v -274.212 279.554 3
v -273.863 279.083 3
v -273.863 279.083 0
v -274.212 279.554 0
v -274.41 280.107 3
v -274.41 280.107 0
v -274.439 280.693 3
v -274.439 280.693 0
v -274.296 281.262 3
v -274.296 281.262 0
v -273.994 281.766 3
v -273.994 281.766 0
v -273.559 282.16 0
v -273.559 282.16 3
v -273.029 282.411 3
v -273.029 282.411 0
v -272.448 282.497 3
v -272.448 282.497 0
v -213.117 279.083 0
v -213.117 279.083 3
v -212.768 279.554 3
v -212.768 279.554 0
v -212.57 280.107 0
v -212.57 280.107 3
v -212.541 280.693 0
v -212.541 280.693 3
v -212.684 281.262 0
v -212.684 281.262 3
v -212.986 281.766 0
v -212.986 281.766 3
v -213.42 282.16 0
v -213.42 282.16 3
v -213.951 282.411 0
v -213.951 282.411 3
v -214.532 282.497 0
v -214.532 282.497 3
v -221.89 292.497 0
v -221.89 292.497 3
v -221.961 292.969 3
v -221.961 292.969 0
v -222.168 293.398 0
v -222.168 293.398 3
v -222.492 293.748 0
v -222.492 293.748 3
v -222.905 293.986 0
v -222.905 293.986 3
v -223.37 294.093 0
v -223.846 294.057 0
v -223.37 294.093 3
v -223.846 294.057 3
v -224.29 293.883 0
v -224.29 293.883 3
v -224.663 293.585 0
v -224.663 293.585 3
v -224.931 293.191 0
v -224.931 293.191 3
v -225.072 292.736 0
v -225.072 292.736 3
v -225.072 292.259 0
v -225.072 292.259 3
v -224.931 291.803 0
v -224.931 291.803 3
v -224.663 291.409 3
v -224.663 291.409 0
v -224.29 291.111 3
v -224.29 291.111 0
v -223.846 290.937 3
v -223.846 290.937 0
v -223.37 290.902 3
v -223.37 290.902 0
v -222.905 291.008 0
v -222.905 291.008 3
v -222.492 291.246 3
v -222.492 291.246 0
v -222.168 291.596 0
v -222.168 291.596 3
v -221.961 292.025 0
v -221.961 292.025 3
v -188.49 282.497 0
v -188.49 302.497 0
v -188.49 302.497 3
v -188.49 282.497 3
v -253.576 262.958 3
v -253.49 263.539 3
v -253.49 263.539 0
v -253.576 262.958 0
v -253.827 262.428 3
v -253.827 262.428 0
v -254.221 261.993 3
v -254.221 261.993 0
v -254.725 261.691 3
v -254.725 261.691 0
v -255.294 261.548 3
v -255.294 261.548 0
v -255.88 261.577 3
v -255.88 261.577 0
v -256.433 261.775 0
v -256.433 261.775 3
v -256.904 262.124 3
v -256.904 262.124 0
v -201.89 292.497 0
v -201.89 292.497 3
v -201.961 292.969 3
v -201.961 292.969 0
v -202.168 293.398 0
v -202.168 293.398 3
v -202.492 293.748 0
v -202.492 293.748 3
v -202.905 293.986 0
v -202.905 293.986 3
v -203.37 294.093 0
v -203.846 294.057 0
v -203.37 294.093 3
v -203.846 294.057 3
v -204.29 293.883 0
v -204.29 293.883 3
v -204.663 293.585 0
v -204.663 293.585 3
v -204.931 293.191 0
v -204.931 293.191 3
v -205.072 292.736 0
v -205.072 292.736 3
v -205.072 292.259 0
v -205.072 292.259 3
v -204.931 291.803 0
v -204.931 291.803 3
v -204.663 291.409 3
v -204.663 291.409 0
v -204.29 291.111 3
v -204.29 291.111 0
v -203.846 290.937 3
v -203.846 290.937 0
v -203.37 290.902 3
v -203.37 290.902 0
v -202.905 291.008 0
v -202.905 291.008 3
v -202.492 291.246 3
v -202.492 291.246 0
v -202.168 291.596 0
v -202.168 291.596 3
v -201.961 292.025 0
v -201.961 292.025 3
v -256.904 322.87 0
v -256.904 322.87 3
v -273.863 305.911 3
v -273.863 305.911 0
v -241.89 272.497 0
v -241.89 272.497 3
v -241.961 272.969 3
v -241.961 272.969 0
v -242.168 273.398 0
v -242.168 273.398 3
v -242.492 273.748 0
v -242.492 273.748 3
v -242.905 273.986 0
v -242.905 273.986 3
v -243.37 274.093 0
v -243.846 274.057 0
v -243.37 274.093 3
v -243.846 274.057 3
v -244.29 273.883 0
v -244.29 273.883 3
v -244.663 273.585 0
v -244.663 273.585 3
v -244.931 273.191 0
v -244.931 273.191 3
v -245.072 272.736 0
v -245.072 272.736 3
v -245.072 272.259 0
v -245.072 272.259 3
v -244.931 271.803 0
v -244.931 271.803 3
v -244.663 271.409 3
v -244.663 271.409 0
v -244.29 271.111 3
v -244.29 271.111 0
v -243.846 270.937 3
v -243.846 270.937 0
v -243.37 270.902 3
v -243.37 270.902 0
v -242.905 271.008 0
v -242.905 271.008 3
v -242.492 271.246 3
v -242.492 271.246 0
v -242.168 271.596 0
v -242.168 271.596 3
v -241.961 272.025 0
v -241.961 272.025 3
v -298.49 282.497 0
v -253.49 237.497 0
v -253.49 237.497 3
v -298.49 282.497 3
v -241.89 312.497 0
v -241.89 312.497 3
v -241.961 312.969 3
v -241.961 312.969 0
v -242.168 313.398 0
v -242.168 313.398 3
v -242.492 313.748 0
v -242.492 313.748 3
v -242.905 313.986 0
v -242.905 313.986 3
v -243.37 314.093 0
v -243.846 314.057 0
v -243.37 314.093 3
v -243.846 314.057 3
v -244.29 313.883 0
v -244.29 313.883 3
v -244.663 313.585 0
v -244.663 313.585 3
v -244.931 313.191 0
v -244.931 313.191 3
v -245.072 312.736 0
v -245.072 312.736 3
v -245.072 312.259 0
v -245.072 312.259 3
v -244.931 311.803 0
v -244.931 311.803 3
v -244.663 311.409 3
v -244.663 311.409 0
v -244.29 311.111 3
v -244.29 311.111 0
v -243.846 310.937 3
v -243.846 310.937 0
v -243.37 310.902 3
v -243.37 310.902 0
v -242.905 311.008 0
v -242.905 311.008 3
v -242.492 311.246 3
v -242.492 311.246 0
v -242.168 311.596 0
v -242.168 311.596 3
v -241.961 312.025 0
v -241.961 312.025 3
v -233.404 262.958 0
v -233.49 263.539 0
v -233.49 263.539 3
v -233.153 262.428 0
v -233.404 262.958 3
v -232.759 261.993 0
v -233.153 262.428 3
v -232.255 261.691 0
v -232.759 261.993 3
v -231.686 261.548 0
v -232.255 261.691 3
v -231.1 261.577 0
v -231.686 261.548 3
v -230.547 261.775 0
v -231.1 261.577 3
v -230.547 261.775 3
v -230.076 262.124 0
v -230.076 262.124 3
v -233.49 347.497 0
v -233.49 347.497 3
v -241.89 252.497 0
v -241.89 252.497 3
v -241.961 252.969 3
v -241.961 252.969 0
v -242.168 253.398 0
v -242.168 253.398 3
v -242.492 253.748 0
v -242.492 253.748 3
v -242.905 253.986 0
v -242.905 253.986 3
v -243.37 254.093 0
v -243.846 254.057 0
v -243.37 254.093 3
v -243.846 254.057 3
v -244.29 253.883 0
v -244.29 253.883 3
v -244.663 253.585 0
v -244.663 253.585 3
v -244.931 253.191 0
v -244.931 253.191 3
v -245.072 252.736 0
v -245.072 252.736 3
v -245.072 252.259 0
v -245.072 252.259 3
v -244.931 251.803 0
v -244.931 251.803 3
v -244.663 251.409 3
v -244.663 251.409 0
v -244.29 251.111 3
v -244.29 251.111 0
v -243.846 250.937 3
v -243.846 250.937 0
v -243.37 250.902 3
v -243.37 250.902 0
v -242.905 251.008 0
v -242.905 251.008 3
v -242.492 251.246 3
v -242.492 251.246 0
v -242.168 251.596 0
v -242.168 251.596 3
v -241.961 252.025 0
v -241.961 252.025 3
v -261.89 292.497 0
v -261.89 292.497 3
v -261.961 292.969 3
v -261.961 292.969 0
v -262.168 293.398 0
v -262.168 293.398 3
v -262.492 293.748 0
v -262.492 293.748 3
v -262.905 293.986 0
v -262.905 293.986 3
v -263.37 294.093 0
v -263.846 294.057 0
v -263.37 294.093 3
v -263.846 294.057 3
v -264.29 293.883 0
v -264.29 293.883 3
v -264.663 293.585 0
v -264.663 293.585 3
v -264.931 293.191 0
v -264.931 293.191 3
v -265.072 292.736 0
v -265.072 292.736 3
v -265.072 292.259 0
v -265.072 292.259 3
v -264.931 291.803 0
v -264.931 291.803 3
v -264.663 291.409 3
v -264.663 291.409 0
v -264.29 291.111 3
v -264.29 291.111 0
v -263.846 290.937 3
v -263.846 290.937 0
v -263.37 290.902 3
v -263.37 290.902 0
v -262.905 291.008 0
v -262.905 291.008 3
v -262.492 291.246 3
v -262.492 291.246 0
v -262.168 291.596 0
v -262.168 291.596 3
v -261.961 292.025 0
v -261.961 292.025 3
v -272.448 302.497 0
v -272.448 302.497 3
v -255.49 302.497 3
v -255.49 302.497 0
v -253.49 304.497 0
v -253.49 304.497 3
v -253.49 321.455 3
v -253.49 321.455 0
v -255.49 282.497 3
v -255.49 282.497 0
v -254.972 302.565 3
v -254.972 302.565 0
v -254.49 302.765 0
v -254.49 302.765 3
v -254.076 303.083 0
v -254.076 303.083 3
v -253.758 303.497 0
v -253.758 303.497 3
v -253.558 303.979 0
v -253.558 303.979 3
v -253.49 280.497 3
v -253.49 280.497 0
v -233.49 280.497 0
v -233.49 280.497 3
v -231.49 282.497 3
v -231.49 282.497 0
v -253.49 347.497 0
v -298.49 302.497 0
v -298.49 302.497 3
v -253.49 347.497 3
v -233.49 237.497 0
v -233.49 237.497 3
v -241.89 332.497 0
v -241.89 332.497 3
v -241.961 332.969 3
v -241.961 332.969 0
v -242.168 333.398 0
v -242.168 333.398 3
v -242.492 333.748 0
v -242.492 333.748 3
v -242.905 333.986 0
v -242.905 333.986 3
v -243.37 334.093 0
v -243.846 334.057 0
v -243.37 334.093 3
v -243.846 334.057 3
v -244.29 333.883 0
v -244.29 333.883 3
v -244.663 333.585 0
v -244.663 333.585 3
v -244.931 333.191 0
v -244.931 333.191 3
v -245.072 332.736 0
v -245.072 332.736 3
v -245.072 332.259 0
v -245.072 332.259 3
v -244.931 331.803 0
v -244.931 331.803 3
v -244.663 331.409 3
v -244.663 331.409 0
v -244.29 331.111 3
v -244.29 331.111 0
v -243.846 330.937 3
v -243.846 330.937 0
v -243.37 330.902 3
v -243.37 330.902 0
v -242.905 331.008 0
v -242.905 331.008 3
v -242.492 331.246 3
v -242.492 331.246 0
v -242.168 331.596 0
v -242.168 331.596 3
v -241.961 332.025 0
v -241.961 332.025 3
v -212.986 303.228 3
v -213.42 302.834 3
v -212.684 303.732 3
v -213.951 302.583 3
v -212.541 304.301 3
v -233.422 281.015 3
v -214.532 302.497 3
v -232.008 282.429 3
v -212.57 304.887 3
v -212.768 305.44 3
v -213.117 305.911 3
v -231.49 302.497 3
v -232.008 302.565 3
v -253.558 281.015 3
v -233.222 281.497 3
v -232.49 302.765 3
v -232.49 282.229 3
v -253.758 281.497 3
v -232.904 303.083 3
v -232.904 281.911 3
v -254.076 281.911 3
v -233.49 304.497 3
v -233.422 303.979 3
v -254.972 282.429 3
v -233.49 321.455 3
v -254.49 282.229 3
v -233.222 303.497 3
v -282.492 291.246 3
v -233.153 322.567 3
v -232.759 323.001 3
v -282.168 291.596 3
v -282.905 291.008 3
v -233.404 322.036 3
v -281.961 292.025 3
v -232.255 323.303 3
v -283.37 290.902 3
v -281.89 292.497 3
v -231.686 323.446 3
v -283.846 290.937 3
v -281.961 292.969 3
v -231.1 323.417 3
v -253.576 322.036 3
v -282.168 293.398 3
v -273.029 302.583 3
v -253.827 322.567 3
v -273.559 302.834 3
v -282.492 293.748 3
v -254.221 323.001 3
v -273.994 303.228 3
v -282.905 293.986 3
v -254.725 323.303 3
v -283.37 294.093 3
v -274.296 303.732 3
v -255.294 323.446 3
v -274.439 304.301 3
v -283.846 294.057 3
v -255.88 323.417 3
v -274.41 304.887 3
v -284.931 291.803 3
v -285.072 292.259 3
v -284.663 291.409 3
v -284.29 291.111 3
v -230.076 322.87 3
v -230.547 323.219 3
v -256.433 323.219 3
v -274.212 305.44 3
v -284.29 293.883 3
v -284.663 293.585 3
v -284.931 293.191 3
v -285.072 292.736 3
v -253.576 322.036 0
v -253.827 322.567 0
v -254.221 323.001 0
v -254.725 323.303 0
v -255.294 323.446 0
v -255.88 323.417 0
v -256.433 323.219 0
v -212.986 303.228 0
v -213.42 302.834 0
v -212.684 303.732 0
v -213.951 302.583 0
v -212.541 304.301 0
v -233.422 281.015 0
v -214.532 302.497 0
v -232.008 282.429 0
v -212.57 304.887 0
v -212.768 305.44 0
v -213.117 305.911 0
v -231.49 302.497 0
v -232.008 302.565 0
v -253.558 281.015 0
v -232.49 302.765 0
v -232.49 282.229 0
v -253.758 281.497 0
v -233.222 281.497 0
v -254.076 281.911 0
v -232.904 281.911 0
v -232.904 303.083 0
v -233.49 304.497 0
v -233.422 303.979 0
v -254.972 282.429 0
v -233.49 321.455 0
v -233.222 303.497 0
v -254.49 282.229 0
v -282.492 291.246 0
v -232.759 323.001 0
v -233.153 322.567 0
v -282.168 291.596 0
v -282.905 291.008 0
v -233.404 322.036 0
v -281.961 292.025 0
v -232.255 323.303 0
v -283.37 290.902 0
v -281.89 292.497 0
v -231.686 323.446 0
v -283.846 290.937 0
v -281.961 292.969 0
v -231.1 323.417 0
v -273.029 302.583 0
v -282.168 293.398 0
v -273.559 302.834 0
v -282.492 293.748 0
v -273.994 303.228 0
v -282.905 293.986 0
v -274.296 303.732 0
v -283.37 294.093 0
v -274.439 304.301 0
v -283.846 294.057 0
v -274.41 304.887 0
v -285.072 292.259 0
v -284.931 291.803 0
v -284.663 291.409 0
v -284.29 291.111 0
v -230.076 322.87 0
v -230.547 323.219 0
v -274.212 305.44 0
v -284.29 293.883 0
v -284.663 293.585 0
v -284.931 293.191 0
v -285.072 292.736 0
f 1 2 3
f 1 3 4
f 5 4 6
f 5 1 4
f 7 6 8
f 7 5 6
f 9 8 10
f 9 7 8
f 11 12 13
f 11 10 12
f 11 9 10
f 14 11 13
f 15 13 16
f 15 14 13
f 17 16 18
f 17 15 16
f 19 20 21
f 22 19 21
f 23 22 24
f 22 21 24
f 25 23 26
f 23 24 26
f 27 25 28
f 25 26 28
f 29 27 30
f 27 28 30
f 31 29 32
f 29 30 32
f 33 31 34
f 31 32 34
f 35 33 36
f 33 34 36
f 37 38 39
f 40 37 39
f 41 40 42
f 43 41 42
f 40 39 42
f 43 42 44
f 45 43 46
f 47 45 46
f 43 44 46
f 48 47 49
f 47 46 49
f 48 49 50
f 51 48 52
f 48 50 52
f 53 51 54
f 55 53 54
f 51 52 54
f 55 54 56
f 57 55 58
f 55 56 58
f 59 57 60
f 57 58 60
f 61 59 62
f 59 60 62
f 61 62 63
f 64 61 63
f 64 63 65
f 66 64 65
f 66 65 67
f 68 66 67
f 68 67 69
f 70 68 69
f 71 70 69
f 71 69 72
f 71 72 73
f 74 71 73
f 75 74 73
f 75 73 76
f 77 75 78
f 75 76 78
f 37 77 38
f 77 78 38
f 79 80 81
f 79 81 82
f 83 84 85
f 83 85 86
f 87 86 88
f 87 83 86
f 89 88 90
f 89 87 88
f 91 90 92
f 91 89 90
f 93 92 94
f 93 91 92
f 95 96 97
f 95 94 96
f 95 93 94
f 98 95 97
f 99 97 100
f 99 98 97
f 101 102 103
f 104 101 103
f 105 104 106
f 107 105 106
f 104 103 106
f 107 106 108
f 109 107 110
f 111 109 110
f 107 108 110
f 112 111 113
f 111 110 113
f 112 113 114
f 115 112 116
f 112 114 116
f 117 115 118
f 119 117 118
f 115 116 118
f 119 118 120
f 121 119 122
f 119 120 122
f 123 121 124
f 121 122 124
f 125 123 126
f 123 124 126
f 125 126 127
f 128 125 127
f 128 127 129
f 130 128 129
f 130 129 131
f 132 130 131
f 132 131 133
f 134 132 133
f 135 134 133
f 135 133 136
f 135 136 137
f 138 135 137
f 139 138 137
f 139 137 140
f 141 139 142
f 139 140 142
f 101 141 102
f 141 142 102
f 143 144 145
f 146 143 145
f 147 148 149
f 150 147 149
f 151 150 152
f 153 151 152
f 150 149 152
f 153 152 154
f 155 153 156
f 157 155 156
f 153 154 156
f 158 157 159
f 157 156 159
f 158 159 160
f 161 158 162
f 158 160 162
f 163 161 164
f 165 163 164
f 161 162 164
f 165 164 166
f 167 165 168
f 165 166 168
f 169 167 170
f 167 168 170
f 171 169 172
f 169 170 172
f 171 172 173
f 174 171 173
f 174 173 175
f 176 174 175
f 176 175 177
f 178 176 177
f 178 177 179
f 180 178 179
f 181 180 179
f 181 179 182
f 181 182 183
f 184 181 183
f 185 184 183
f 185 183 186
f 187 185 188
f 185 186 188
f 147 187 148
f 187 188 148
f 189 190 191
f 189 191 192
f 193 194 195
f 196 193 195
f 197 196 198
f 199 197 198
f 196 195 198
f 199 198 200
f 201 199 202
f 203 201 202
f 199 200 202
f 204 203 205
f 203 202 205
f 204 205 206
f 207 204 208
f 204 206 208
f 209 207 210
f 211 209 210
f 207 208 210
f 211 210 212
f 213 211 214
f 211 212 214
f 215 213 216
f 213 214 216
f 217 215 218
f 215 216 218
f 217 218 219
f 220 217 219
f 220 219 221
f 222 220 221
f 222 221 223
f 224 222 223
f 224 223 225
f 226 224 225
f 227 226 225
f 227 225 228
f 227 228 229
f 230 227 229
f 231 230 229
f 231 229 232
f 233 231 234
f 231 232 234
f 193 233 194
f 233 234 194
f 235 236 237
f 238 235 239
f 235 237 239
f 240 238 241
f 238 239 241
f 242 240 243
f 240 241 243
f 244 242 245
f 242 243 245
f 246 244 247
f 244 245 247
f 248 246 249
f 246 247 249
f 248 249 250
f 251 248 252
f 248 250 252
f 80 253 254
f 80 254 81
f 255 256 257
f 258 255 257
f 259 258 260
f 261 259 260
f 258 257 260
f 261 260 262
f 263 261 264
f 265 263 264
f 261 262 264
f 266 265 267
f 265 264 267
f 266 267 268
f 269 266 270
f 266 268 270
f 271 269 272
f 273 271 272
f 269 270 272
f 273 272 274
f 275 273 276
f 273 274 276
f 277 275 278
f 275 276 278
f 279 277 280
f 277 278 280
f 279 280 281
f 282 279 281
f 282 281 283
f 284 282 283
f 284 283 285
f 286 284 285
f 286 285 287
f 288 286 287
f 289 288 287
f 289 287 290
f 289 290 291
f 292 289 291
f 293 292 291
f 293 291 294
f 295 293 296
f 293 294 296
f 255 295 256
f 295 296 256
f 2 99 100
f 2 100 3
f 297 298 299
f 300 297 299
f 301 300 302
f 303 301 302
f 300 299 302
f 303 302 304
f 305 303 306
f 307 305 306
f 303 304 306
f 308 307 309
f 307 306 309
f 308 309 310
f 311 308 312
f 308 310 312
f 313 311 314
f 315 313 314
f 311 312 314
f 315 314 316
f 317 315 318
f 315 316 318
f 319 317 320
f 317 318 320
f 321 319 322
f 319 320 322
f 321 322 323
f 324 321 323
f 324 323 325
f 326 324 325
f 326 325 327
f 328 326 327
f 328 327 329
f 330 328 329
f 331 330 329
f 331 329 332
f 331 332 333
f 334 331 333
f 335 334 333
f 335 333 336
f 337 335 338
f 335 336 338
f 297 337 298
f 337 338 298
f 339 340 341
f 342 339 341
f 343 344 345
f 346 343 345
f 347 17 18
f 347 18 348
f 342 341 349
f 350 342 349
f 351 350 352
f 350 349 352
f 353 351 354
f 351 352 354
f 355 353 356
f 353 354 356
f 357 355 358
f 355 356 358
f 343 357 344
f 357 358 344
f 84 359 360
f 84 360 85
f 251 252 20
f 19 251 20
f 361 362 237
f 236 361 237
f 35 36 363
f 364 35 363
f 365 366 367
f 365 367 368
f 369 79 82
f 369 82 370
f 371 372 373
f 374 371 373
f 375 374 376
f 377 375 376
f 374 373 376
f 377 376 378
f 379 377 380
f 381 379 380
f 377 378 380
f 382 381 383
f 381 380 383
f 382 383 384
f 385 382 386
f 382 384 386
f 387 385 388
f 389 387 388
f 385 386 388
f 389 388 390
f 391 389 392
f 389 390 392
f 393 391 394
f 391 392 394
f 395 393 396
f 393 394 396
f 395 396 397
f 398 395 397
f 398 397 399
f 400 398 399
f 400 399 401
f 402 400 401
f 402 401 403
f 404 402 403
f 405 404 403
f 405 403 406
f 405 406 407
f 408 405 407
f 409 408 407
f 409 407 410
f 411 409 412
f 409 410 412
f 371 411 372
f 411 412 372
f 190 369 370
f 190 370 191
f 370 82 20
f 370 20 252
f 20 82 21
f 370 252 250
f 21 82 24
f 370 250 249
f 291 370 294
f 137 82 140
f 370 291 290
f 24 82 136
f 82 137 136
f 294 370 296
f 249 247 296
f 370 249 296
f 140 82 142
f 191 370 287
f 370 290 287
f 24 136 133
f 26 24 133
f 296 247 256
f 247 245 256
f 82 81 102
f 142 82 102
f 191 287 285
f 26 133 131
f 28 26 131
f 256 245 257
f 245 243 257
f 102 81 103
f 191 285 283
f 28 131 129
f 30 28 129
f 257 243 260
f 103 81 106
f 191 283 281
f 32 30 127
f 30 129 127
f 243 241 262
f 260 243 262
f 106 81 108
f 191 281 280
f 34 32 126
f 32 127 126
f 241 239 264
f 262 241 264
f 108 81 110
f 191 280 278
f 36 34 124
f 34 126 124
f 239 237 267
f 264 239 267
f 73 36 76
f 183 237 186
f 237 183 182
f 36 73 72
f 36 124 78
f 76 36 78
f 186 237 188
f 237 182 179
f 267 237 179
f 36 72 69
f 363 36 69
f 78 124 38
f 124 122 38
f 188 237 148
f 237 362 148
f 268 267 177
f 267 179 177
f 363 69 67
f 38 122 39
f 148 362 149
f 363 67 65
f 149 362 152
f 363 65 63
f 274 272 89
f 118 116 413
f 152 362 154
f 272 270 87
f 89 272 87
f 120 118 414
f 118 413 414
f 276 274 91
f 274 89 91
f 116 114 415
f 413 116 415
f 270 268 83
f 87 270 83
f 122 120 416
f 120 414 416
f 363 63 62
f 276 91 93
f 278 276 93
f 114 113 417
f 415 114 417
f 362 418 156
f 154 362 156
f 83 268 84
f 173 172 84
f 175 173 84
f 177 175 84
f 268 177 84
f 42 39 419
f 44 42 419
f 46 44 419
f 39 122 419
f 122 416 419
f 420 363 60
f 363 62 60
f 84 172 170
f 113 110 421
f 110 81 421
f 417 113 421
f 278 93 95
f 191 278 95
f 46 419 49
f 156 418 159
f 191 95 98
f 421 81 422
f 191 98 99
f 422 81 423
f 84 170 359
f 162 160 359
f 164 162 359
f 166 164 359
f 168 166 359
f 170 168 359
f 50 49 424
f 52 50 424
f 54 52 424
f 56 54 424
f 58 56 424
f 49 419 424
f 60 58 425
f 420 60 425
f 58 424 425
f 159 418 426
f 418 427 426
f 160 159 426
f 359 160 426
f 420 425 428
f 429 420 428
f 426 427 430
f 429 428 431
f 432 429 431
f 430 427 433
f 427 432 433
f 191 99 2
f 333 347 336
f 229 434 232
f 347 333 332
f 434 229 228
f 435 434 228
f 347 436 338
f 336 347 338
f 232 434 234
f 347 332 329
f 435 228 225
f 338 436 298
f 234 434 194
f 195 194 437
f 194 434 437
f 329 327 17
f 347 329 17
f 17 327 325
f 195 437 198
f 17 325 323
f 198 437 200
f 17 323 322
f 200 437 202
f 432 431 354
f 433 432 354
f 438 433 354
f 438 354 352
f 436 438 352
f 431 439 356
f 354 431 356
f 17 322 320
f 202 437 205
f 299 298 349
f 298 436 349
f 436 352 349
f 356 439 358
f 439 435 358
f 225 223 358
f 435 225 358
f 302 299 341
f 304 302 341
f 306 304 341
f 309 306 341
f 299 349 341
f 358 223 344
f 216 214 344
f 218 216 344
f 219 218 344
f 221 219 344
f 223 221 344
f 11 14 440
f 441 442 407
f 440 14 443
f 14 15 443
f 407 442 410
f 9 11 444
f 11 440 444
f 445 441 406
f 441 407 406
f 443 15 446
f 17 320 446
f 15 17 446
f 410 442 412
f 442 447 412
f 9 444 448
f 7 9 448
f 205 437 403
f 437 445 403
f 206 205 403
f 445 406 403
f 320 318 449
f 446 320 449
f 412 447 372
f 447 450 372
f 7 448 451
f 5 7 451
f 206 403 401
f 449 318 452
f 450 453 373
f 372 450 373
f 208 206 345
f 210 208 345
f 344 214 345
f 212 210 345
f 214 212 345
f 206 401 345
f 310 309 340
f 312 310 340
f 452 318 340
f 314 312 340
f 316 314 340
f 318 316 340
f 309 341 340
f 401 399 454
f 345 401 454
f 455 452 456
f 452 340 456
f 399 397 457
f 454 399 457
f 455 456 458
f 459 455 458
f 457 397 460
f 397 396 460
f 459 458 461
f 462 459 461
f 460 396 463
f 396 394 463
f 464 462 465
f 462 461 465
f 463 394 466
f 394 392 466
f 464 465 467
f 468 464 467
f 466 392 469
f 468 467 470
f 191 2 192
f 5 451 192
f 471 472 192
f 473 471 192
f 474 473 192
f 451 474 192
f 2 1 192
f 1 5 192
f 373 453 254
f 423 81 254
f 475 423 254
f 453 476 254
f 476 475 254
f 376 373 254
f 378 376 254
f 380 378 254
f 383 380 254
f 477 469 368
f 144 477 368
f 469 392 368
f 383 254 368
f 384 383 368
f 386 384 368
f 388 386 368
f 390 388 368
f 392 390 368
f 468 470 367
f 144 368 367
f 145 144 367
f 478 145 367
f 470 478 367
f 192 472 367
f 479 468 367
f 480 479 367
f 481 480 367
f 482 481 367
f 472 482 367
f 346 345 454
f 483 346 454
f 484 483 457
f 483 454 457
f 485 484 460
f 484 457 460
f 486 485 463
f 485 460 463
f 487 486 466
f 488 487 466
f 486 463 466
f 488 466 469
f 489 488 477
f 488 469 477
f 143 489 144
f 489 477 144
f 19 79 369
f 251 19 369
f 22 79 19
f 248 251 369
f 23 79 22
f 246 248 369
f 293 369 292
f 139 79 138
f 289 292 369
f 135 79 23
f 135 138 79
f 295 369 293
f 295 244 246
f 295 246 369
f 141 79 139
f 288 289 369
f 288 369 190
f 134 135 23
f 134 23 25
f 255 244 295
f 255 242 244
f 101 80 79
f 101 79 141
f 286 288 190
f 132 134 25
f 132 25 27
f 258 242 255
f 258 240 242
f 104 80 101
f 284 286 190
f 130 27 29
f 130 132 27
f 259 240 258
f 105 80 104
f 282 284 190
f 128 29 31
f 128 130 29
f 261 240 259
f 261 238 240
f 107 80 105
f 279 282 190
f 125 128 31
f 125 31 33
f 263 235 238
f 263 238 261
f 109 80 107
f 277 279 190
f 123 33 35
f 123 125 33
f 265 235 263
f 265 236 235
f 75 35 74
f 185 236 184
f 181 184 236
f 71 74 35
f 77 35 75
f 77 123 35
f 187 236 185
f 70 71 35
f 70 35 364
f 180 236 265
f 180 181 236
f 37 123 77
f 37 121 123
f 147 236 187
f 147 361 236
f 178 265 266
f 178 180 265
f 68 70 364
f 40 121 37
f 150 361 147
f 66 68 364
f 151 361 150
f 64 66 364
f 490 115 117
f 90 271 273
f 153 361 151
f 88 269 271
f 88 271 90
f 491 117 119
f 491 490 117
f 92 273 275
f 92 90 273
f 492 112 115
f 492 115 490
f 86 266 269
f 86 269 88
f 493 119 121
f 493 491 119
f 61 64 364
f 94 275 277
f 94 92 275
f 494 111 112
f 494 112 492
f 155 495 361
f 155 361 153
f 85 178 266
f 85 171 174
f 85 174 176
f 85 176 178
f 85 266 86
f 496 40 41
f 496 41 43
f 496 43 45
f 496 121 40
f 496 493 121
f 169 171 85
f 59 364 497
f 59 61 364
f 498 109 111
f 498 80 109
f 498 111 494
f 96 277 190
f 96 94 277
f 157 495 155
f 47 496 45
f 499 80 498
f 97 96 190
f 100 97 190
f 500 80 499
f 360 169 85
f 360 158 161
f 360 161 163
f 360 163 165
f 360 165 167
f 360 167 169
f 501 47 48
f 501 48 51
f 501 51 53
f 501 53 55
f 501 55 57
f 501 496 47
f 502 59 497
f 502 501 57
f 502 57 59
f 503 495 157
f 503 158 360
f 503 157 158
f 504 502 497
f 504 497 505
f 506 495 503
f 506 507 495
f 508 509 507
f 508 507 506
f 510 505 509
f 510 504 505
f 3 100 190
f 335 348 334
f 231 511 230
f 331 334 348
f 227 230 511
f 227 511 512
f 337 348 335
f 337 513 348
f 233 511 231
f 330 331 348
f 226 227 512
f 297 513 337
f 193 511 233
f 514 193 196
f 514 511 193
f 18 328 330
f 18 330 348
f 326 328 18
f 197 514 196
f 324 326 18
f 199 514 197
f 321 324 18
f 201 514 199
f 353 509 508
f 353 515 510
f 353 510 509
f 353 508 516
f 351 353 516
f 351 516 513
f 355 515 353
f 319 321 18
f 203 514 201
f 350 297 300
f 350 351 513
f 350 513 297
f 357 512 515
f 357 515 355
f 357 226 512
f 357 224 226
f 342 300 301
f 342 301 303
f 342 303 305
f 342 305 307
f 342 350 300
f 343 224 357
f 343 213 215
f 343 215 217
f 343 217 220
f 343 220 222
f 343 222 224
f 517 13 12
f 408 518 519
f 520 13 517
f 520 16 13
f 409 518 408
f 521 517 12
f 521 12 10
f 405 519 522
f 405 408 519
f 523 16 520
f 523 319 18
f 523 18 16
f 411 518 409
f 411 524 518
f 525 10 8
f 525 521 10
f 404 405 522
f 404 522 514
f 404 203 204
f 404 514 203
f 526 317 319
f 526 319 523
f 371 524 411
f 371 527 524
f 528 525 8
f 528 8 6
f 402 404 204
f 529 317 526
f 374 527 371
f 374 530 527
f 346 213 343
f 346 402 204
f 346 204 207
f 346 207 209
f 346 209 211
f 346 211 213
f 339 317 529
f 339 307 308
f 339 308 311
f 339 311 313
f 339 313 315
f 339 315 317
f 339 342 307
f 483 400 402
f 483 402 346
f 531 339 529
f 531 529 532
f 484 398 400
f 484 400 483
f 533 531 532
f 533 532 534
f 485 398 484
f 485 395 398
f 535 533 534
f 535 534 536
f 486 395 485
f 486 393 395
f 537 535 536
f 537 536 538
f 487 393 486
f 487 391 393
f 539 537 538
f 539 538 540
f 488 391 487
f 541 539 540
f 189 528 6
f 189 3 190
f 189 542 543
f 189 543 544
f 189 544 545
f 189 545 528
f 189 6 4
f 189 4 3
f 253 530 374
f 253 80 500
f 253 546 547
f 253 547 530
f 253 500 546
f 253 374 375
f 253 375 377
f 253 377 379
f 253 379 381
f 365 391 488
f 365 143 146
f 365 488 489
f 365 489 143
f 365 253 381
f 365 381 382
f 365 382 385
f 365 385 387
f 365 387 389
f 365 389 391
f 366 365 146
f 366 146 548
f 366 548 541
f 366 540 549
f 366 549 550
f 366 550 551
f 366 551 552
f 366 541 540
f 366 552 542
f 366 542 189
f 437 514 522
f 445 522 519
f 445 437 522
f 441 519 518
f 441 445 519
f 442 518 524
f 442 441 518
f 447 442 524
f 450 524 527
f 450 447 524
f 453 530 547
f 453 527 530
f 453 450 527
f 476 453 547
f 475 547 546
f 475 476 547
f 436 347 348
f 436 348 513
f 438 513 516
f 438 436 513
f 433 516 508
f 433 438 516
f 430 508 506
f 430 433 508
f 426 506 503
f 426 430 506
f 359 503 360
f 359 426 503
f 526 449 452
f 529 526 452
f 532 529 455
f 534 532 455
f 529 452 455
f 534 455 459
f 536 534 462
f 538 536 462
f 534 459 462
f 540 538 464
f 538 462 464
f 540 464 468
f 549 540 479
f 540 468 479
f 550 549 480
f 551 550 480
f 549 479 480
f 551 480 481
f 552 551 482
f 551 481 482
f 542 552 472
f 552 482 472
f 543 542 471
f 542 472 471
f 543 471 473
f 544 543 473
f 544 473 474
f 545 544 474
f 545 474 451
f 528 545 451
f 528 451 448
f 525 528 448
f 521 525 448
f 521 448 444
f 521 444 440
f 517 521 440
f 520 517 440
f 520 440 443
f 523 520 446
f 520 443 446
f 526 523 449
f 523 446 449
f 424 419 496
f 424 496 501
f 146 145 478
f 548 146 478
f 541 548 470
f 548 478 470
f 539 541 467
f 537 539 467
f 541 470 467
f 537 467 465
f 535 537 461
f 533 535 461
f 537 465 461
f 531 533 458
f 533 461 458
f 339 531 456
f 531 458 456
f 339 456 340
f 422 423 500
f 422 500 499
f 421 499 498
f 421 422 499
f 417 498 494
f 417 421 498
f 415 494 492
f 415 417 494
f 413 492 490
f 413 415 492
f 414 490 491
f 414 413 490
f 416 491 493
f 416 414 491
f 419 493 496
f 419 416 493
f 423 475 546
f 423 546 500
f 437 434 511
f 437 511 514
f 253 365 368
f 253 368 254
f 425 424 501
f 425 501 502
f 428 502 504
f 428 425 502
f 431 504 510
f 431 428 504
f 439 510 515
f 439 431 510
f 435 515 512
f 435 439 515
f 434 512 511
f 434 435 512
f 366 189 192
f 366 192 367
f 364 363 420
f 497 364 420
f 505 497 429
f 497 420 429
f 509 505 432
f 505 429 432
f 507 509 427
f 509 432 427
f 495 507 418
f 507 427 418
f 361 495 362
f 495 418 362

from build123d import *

# Parameters (mm, degrees)
EXTRUDE1_DEPTH     = 3
SKETCH2_R          = 1.6
CUT_EXTRUDE1_DEPTH = 3
EXTRUDE2_DEPTH     = 10


with BuildPart() as part:
    # Sketch1 → Extrude1 (new body)
    with BuildSketch(Plane.XY):
        Polygon((-253.489921235, 347.497048214), (-233.489921235, 347.497048214), (-188.489921235, 302.497048214), (-188.489921235, 282.497048214), (-233.489921235, 237.497048214), (-253.489921235, 237.497048214), (-298.489921235, 282.497048214), (-298.489921235, 302.497048214), align=None)
    extrude(amount=EXTRUDE1_DEPTH)

    # Sketch2 → Cut-Extrude1 (cut)
    with BuildSketch(Plane.XY.offset(3)):
        with Locations((-203.489921235, 292.497048214)):
            Circle(SKETCH2_R)
        with Locations((-223.489921235, 292.497048214)):
            Circle(SKETCH2_R)
        with Locations((-243.489921235, 252.497048214)):
            Circle(SKETCH2_R)
        with Locations((-243.489921235, 272.497048214)):
            Circle(SKETCH2_R)
        with Locations((-283.489921235, 292.497048214)):
            Circle(SKETCH2_R)
        with Locations((-263.489921235, 292.497048214)):
            Circle(SKETCH2_R)
        with Locations((-243.489921235, 312.497048214)):
            Circle(SKETCH2_R)
        with Locations((-243.489921235, 332.497048214)):
            Circle(SKETCH2_R)
    extrude(amount=-CUT_EXTRUDE1_DEPTH, mode=Mode.SUBTRACT)

    # Sketch3 → Extrude2 (cut)
    with BuildSketch(Plane.XY.offset(3)):
        with BuildLine():
            Line((-256.904134797, 322.869631216), (-273.862504237, 305.911261776))
            ThreePointArc((-273.862504237, 305.911261776), (-274.29604974, 303.731681349), (-272.448290675, 302.497048214))
            Line((-272.448290675, 302.497048214), (-255.489921235, 302.497048214))
            ThreePointArc((-255.489921235, 302.497048214), (-254.075707673, 303.082834651), (-253.489921235, 304.497048214))
            Line((-253.489921235, 304.497048214), (-253.489921235, 321.455417653))
            ThreePointArc((-253.489921235, 321.455417653), (-254.72455437, 323.303176718), (-256.904134797, 322.869631216))
        make_face()
        with BuildLine():
            Line((-233.489921235, 304.497048214), (-233.489921235, 321.455417653))
            ThreePointArc((-233.489921235, 321.455417653), (-232.2552881, 323.303176718), (-230.075707673, 322.869631216))
            Line((-230.075707673, 322.869631216), (-213.117338233, 305.911261776))
            ThreePointArc((-213.117338233, 305.911261776), (-212.68379273, 303.731681349), (-214.531551795, 302.497048214))
            Line((-214.531551795, 302.497048214), (-231.489921235, 302.497048214))
            ThreePointArc((-231.489921235, 302.497048214), (-232.904134797, 303.082834651), (-233.489921235, 304.497048214))
        make_face()
        with BuildLine():
            Line((-230.075707673, 262.124465212), (-213.117338233, 279.082834651))
            ThreePointArc((-213.117338233, 279.082834651), (-212.68379273, 281.262415078), (-214.531551795, 282.497048214))
            Line((-214.531551795, 282.497048214), (-231.489921235, 282.497048214))
            ThreePointArc((-231.489921235, 282.497048214), (-232.904134797, 281.911261776), (-233.489921235, 280.497048214))
            Line((-233.489921235, 280.497048214), (-233.489921235, 263.538678774))
            ThreePointArc((-233.489921235, 263.538678774), (-232.2552881, 261.690919709), (-230.075707673, 262.124465212))
        make_face()
        with BuildLine():
            Line((-253.489921235, 280.497048214), (-253.489921235, 263.538678774))
            ThreePointArc((-253.489921235, 263.538678774), (-254.72455437, 261.690919709), (-256.904134797, 262.124465212))
            Line((-256.904134797, 262.124465212), (-273.862504237, 279.082834651))
            ThreePointArc((-273.862504237, 279.082834651), (-274.29604974, 281.262415078), (-272.448290675, 282.497048214))
            Line((-272.448290675, 282.497048214), (-255.489921235, 282.497048214))
            ThreePointArc((-255.489921235, 282.497048214), (-254.075707673, 281.911261776), (-253.489921235, 280.497048214))
        make_face()
    extrude(amount=-EXTRUDE2_DEPTH, mode=Mode.SUBTRACT)


solid = part.part
